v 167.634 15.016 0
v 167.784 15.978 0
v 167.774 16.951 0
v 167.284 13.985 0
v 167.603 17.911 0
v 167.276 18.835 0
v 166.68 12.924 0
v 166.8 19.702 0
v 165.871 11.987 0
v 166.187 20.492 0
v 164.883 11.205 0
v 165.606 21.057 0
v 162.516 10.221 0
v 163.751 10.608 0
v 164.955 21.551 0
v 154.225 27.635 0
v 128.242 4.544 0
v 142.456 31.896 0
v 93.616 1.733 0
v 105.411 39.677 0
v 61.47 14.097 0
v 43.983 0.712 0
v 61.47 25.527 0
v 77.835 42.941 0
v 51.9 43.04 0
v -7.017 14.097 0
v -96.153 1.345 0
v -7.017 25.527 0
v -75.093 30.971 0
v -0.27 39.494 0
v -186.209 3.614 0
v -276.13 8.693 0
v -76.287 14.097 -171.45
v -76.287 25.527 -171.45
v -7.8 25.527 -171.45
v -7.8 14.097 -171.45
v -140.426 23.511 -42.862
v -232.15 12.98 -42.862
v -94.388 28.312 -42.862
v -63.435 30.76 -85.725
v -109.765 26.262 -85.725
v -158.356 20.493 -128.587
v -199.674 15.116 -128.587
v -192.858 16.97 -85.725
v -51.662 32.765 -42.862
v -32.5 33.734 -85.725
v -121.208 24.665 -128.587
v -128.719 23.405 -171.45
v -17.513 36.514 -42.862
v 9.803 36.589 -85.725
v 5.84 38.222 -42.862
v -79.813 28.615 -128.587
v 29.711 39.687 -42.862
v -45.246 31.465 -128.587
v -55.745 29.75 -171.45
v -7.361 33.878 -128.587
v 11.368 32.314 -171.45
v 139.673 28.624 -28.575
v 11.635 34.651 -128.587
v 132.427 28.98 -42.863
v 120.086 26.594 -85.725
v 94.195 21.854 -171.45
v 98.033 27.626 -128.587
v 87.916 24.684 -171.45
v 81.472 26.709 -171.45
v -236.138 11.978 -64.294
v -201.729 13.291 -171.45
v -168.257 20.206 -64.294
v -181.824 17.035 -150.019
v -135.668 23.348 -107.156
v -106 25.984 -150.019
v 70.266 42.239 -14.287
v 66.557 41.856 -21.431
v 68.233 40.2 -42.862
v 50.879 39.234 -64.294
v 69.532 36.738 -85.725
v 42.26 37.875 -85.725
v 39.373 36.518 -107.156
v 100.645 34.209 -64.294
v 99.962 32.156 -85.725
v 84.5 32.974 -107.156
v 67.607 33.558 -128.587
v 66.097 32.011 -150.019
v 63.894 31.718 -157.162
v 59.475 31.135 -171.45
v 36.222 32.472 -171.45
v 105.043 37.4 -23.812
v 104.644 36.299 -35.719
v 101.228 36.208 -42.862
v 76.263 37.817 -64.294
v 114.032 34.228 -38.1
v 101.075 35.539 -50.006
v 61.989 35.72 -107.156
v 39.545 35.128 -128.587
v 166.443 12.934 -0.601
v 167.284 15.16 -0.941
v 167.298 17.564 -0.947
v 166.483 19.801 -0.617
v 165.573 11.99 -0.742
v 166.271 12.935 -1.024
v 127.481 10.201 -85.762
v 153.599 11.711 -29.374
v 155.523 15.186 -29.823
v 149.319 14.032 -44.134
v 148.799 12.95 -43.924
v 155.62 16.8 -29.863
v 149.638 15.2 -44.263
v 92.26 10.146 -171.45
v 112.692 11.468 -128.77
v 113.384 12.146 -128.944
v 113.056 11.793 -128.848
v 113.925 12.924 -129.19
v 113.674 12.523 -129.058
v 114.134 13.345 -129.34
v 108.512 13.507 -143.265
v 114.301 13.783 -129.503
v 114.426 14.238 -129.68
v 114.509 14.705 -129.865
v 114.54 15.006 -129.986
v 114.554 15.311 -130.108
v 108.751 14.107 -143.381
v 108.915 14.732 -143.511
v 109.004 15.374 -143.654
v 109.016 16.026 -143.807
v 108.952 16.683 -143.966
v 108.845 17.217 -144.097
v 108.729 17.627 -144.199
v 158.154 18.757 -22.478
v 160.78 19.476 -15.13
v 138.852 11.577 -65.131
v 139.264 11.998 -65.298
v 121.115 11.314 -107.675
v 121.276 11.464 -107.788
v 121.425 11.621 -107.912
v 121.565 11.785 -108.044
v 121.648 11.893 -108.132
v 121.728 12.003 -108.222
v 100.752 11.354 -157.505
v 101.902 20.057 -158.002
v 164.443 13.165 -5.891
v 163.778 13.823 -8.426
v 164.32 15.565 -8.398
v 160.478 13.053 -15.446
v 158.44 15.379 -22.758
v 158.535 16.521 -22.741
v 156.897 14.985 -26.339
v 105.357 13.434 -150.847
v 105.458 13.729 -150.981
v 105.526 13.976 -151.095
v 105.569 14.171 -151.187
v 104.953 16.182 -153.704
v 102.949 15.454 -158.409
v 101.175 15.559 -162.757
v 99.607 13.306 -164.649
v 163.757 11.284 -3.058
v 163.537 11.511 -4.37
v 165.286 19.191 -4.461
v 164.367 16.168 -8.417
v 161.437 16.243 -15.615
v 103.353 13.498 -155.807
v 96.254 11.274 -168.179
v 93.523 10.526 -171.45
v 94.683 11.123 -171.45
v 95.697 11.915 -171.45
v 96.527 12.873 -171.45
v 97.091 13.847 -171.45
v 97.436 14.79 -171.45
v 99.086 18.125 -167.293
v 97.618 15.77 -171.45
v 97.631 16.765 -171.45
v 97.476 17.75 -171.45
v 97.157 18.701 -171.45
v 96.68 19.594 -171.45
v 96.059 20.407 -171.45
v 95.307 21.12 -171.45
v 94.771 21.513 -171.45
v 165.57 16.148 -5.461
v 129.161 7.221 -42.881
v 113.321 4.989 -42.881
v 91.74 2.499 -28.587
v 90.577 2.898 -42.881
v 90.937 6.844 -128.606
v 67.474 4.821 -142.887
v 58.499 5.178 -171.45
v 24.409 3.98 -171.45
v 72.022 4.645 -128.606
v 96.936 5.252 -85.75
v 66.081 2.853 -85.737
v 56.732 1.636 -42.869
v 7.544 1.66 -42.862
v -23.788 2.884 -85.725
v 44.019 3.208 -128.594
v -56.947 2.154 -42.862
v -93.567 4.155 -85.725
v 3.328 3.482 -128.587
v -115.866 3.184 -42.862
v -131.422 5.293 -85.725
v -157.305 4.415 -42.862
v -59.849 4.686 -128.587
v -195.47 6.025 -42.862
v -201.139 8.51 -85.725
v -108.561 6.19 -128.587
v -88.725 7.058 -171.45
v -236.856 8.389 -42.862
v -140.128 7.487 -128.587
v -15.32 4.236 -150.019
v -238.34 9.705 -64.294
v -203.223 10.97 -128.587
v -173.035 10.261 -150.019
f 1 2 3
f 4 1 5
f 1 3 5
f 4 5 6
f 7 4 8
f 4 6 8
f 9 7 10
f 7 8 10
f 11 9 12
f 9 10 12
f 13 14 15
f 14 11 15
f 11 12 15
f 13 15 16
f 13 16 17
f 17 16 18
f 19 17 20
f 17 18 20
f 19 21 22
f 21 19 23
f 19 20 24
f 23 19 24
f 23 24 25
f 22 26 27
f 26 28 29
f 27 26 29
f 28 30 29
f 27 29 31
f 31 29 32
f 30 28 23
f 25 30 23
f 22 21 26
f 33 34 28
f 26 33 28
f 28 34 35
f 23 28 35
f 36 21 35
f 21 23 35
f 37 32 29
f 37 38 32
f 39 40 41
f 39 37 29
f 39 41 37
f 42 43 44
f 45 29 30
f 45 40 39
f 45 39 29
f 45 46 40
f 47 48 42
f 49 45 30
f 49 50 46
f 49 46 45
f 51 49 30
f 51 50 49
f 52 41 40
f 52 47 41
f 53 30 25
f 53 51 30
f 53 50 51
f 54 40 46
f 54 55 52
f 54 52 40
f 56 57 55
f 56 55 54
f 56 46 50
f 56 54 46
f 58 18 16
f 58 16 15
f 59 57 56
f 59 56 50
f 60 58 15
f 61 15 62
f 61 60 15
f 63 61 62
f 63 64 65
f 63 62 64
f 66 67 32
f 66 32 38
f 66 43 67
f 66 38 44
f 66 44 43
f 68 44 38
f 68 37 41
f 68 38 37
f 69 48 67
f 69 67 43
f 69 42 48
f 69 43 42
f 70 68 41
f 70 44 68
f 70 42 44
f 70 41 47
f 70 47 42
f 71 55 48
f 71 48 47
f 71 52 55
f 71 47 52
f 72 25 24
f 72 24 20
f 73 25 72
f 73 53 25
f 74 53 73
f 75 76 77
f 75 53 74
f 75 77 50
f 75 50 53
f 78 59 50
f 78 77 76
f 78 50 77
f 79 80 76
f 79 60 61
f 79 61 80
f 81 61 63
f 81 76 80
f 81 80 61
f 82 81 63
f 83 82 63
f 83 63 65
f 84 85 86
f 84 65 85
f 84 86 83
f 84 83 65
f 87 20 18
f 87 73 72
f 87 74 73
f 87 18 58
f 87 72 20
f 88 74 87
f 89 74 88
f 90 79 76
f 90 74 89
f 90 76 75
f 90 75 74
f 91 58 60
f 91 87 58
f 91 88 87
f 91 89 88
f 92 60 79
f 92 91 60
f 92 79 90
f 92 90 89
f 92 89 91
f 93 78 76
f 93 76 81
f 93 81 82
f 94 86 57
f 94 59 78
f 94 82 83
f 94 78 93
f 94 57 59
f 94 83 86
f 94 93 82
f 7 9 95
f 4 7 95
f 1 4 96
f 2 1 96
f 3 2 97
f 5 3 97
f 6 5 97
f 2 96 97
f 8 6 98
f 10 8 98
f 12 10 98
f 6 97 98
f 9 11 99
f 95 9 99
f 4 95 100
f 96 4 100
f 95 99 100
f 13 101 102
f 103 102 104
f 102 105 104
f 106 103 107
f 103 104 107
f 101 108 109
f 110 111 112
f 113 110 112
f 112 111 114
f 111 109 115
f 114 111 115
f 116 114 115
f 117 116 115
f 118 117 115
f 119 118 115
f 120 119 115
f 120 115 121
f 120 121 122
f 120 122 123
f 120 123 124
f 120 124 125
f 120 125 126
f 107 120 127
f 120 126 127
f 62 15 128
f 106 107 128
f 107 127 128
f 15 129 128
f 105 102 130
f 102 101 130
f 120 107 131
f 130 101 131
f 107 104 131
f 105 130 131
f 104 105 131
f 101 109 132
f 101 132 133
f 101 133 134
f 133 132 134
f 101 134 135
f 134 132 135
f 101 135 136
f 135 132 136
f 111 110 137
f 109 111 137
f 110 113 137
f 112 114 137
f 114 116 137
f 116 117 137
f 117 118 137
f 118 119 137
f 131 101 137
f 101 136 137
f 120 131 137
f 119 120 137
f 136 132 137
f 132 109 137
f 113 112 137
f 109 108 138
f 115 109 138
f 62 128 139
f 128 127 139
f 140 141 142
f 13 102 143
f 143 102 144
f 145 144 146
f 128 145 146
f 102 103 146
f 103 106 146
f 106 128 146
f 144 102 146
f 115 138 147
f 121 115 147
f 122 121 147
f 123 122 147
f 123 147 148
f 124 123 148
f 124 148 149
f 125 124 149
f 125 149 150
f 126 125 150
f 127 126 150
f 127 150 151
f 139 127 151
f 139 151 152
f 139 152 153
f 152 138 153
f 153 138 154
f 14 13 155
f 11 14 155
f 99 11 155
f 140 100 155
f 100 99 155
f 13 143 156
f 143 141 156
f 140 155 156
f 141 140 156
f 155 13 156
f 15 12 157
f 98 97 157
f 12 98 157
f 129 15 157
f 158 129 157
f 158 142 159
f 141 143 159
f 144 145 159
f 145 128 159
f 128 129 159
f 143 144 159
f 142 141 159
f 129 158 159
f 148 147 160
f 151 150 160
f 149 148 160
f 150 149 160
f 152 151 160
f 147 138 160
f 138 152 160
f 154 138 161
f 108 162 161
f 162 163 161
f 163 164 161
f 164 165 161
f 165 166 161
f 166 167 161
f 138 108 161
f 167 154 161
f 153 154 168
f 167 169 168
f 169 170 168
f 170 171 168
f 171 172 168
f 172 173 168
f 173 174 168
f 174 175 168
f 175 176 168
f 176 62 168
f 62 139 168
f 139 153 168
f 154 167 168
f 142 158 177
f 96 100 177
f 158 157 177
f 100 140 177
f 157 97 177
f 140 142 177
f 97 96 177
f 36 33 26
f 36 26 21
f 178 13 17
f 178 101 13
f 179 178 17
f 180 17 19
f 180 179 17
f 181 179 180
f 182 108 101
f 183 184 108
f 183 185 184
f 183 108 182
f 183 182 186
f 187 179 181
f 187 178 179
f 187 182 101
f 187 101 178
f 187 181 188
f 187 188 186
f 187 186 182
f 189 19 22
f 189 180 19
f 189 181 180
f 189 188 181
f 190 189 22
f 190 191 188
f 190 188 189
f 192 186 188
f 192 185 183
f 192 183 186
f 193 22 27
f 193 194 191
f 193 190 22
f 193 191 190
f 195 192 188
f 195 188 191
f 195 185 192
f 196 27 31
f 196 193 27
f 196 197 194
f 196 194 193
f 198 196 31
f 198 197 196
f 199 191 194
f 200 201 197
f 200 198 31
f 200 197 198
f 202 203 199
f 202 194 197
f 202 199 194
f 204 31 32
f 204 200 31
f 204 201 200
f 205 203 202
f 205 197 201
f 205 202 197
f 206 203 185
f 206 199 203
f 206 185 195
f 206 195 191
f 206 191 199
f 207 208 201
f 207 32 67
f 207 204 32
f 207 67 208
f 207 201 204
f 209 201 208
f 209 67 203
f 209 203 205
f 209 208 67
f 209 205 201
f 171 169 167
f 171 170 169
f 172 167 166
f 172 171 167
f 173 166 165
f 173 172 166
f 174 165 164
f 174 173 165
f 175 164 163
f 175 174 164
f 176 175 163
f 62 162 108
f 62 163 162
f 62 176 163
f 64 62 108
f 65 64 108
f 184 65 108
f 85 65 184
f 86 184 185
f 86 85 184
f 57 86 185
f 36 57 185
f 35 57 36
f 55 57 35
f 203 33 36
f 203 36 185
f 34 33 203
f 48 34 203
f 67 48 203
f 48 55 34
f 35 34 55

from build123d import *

# Parameters (mm, degrees)
FILLET1_R          = 6.35
CUT_EXTRUDE2_DEPTH = 5.715


with BuildPart() as part:
    # Loft1: read off the stored shape, not the designer's step
    # Loft1: loft between two sections, ruled curve by curve
    loft1_from = [
        Edge.make_bspline([(175.269753602, 13.29140622, 0), (165.836250903, 10.800407431, 0), (146.733604162, 6.768636817, 0), (117.705631888, 3.120825545, 0), (88.515569293, 1.298481639, 0), (69.014979931, 0.896470859, 0), (55.76421182, 0.761993128, 0), (48.774937515, 0.717177079, 0), (38.290373313, 0.701329652, 0), (27.805353703, 0.707699483, 0), (17.319910015, 0.713085206, 0), (6.83407663, 0.722118469, 0), (-7.147508406, 0.739950104, 0), (-24.625279721, 0.778748607, 0), (-45.599536509, 0.865679132, 0), (-66.57427479, 1.007789933, 0), (-87.548981294, 1.219546921, 0), (-115.514221109, 1.6142682, 0), (-150.466857604, 2.354791987, 0), (-192.394333089, 3.75520411, 0), (-234.292384281, 5.782786145, 0), (-262.192310795, 7.628406717, 0), (-276.130119323, 8.693130358, 0)], [0, 0, 0, 0, 0.0646771, 0.1293542, 0.1940313, 0.2587084, 0.2587084, 0.281873762, 0.305039125, 0.328204487, 0.35136985, 0.374535212, 0.397700575, 0.4440313, 0.490362025, 0.53669275, 0.583023475, 0.6293542, 0.72201565, 0.8146771, 0.90733855, 1, 1, 1, 1], 3),
        Edge.make_bspline([(-276.130119323, 8.693130358, 0), (-268.53787532, 9.576768707, 0), (-253.325399224, 11.344499336, 0), (-230.431819466, 13.984673016, 0), (-207.472747934, 16.599459007, 0), (-188.293872161, 18.747068462, 0), (-172.928345638, 20.442413166, 0), (-161.394414944, 21.702112718, 0), (-149.852162971, 22.949878112, 0), (-138.303049105, 24.185400988, 0), (-126.749160881, 25.414250719, 0), (-115.192581437, 26.642009102, 0), (-103.635319012, 27.873545783, 0), (-92.079421128, 29.114032776, 0), (-82.4523943, 30.15987089, 0), (-74.753639148, 31.007237325, 0), (-68.981311413, 31.649138297, 0), (-63.211054502, 32.298649993, 0), (-57.443210697, 32.957070927, 0), (-51.678207111, 33.626346988, 0), (-45.916440626, 34.308134914, 0), (-40.158566872, 35.006057107, 0), (-34.405025776, 35.721868628, 0), (-28.65726222, 36.464938228, 0), (-22.912163066, 37.208891257, 0), (-17.164494437, 37.912252593, 0), (-11.409460822, 38.52679641, 0), (-5.649439363, 39.060124365, 0), (0.112709129, 39.531603667, 0), (5.875152486, 39.955359252, 0), (11.636225955, 40.347755751, 0), (17.394685212, 40.723251, 0), (23.149306668, 41.097541248, 0), (28.899044879, 41.484229227, 0), (34.642434767, 41.900999198, 0), (40.378877605, 42.351270671, 0), (46.114635135, 42.749637865, 0), (51.851500917, 43.055266027, 0), (59.500067158, 43.326067455, 0), (69.055892317, 43.378352696, 0), (80.491984345, 42.872950191, 0), (88.069711352, 42.111461167, 0), (96.99345827, 41.022920564, 0), (106.798051302, 39.527027067, 0), (120.757492461, 36.908252937, 0), (134.380844207, 33.958325891, 0), (143.515206323, 31.743252941, 0), (149.29638768, 29.715848138, 0), (151.784819047, 28.759100363, 0), (156.573051684, 26.578927821, 0), (162.27208079, 23.407349715, 0), (168.873329947, 18.939330848, 0), (173.160310936, 15.339346478, 0), (175.269753602, 13.29140622, 0)], [0, 0, 0, 0, 0.049341751, 0.098683502, 0.148025253, 0.197367004, 0.22203788, 0.246708755, 0.271379631, 0.296050506, 0.320721382, 0.345392257, 0.370063133, 0.394734008, 0.419404884, 0.431740322, 0.444075759, 0.456411197, 0.468746635, 0.481082073, 0.49341751, 0.505752948, 0.518088386, 0.530423824, 0.542759261, 0.555094699, 0.567430137, 0.579765575, 0.592101012, 0.60443645, 0.616771888, 0.629107326, 0.641442763, 0.653778201, 0.666113639, 0.678449077, 0.690784514, 0.703119952, 0.71545539, 0.740126266, 0.764797141, 0.789468017, 0.789468017, 0.823121948, 0.856775879, 0.89042981, 0.924083742, 0.924083742, 0.933573274, 0.943062806, 0.962041871, 0.981020935, 1, 1, 1, 1], 3),
    ]
    loft1_to = [
        Edge.make_bspline([(105.998873038, 13.291406071, -171.45), (99.547178972, 11.655691815, -171.45), (86.528720121, 8.807386477, -171.45), (66.752163818, 5.81997153, -171.45), (46.823097819, 4.126992417, -171.45), (33.499454727, 3.863700867, -171.45), (24.460450661, 3.97819944, -171.45), (19.693183294, 4.042786303, -171.45), (12.542798034, 4.152256247, -171.45), (5.392928427, 4.274314749, -171.45), (-1.75642567, 4.408960717, -171.45), (-8.905264395, 4.556193059, -171.45), (-18.436362387, 4.769283228, -171.45), (-30.34894715, 5.067106419, -171.45), (-44.641989626, 5.474822285, -171.45), (-58.932973358, 5.932868481, -171.45), (-73.221898844, 6.441247299, -171.45), (-92.271055825, 7.186198942, -171.45), (-116.077358919, 8.24323151, -171.45), (-144.636691691, 9.71312147, -171.45), (-173.187791596, 11.38456436, -171.45), (-192.216363366, 12.633355108, -171.45), (-201.72927398, 13.291406071, -171.45)], [0, 0, 0, 0, 0.0646771, 0.1293542, 0.1940313, 0.2587084, 0.2587084, 0.281873762, 0.305039125, 0.328204487, 0.35136985, 0.374535212, 0.397700575, 0.4440313, 0.490362025, 0.53669275, 0.583023475, 0.6293542, 0.72201565, 0.8146771, 0.90733855, 1, 1, 1, 1], 3),
        Edge.make_bspline([(-201.72927398, 13.291406071, -171.45), (-196.706001762, 14.118734782, -171.45), (-186.669871897, 15.717039915, -171.45), (-171.640734103, 17.947797667, -171.45), (-156.630466607, 20.014212394, -171.45), (-144.132480019, 21.601236244, -171.45), (-134.13733919, 22.791040732, -171.45), (-126.641873709, 23.64360893, -171.45), (-119.146564288, 24.456514085, -171.45), (-111.650676847, 25.229878327, -171.45), (-104.153477306, 25.963823782, -171.45), (-96.654231583, 26.658472577, -171.45), (-89.152205599, 27.313946841, -171.45), (-81.646665274, 27.9303687, -171.45), (-75.388507985, 28.411611685, -171.45), (-70.379479761, 28.777128777, -171.45), (-66.621362852, 29.041524908, -171.45), (-62.861805656, 29.296176313, -171.45), (-59.100713628, 29.541079951, -171.45), (-55.337992223, 29.776232783, -171.45), (-51.573546895, 30.001631769, -171.45), (-47.8072831, 30.217273872, -171.45), (-44.039106291, 30.42315605, -171.45), (-40.268921924, 30.619275264, -171.45), (-36.496635452, 30.805628475, -171.45), (-32.722152332, 30.982212644, -171.45), (-28.945378018, 31.149024731, -171.45), (-25.166217963, 31.306061697, -171.45), (-21.384577624, 31.453320502, -171.45), (-17.600362454, 31.590798107, -171.45), (-13.813466378, 31.718470556, -171.45), (-10.023783319, 31.836313894, -171.45), (-6.231207201, 31.944304163, -171.45), (-2.435631947, 32.042417409, -171.45), (1.363048518, 32.130629675, -171.45), (5.164940272, 32.208917006, -171.45), (8.970149389, 32.277255445, -171.45), (12.778781947, 32.335621037, -171.45), (17.861664714, 32.400112757, -171.45), (24.224357154, 32.455675508, -171.45), (31.874979066, 32.482076127, -171.45), (36.986220068, 32.472698987, -171.45), (43.034735977, 32.445594637, -171.45), (50.252197512, 32.186193716, -171.45), (61.575304209, 30.990235835, -171.45), (73.03796941, 28.932962432, -171.45), (80.486980807, 27.023727732, -171.45), (85.121527508, 25.659816178, -171.45), (87.166401389, 24.993278477, -171.45), (91.228193462, 23.397991092, -171.45), (96.154779045, 20.919674072, -171.45), (101.516443745, 17.32147055, -171.45), (104.593880705, 14.655434782, -171.45), (105.998873038, 13.291406071, -171.45)], [0, 0, 0, 0, 0.049341751, 0.098683502, 0.148025253, 0.197367004, 0.22203788, 0.246708755, 0.271379631, 0.296050506, 0.320721382, 0.345392257, 0.370063133, 0.394734008, 0.419404884, 0.431740322, 0.444075759, 0.456411197, 0.468746635, 0.481082073, 0.49341751, 0.505752948, 0.518088386, 0.530423824, 0.542759261, 0.555094699, 0.567430137, 0.579765575, 0.592101012, 0.60443645, 0.616771888, 0.629107326, 0.641442763, 0.653778201, 0.666113639, 0.678449077, 0.690784514, 0.703119952, 0.71545539, 0.740126266, 0.764797141, 0.789468017, 0.789468017, 0.823121948, 0.856775879, 0.89042981, 0.924083742, 0.924083742, 0.933573274, 0.943062806, 0.962041871, 0.981020935, 1, 1, 1, 1], 3),
    ]
    loft1 = Solid(Shell([*[Face.make_surface_from_curves(loft1_from[k], loft1_to[k]) for k in range(2)], Face(Wire(loft1_from)), Face(Wire(loft1_to))]))
    add(loft1)

    # Fillet1
    fillet1_edges = [part.edges().sort_by_distance(p)[0] for p in [
        (140.63431332, 13.291406146, -85.725),
    ]]
    fillet(fillet1_edges, radius=FILLET1_R)

    # Sketch9 → Cut-Extrude2 (cut, symmetric)
    with BuildSketch(Plane(origin=(0, 19.812, 0), x_dir=(1, 0, 0), z_dir=(0, 1, 0))):
        Polygon((-7.80027398, 171.45), (-76.28723014, 171.45), (-7.016933721, 0), (61.470022439, 0), align=None)
    extrude(amount=CUT_EXTRUDE2_DEPTH, both=True, mode=Mode.SUBTRACT)


solid = part.part
